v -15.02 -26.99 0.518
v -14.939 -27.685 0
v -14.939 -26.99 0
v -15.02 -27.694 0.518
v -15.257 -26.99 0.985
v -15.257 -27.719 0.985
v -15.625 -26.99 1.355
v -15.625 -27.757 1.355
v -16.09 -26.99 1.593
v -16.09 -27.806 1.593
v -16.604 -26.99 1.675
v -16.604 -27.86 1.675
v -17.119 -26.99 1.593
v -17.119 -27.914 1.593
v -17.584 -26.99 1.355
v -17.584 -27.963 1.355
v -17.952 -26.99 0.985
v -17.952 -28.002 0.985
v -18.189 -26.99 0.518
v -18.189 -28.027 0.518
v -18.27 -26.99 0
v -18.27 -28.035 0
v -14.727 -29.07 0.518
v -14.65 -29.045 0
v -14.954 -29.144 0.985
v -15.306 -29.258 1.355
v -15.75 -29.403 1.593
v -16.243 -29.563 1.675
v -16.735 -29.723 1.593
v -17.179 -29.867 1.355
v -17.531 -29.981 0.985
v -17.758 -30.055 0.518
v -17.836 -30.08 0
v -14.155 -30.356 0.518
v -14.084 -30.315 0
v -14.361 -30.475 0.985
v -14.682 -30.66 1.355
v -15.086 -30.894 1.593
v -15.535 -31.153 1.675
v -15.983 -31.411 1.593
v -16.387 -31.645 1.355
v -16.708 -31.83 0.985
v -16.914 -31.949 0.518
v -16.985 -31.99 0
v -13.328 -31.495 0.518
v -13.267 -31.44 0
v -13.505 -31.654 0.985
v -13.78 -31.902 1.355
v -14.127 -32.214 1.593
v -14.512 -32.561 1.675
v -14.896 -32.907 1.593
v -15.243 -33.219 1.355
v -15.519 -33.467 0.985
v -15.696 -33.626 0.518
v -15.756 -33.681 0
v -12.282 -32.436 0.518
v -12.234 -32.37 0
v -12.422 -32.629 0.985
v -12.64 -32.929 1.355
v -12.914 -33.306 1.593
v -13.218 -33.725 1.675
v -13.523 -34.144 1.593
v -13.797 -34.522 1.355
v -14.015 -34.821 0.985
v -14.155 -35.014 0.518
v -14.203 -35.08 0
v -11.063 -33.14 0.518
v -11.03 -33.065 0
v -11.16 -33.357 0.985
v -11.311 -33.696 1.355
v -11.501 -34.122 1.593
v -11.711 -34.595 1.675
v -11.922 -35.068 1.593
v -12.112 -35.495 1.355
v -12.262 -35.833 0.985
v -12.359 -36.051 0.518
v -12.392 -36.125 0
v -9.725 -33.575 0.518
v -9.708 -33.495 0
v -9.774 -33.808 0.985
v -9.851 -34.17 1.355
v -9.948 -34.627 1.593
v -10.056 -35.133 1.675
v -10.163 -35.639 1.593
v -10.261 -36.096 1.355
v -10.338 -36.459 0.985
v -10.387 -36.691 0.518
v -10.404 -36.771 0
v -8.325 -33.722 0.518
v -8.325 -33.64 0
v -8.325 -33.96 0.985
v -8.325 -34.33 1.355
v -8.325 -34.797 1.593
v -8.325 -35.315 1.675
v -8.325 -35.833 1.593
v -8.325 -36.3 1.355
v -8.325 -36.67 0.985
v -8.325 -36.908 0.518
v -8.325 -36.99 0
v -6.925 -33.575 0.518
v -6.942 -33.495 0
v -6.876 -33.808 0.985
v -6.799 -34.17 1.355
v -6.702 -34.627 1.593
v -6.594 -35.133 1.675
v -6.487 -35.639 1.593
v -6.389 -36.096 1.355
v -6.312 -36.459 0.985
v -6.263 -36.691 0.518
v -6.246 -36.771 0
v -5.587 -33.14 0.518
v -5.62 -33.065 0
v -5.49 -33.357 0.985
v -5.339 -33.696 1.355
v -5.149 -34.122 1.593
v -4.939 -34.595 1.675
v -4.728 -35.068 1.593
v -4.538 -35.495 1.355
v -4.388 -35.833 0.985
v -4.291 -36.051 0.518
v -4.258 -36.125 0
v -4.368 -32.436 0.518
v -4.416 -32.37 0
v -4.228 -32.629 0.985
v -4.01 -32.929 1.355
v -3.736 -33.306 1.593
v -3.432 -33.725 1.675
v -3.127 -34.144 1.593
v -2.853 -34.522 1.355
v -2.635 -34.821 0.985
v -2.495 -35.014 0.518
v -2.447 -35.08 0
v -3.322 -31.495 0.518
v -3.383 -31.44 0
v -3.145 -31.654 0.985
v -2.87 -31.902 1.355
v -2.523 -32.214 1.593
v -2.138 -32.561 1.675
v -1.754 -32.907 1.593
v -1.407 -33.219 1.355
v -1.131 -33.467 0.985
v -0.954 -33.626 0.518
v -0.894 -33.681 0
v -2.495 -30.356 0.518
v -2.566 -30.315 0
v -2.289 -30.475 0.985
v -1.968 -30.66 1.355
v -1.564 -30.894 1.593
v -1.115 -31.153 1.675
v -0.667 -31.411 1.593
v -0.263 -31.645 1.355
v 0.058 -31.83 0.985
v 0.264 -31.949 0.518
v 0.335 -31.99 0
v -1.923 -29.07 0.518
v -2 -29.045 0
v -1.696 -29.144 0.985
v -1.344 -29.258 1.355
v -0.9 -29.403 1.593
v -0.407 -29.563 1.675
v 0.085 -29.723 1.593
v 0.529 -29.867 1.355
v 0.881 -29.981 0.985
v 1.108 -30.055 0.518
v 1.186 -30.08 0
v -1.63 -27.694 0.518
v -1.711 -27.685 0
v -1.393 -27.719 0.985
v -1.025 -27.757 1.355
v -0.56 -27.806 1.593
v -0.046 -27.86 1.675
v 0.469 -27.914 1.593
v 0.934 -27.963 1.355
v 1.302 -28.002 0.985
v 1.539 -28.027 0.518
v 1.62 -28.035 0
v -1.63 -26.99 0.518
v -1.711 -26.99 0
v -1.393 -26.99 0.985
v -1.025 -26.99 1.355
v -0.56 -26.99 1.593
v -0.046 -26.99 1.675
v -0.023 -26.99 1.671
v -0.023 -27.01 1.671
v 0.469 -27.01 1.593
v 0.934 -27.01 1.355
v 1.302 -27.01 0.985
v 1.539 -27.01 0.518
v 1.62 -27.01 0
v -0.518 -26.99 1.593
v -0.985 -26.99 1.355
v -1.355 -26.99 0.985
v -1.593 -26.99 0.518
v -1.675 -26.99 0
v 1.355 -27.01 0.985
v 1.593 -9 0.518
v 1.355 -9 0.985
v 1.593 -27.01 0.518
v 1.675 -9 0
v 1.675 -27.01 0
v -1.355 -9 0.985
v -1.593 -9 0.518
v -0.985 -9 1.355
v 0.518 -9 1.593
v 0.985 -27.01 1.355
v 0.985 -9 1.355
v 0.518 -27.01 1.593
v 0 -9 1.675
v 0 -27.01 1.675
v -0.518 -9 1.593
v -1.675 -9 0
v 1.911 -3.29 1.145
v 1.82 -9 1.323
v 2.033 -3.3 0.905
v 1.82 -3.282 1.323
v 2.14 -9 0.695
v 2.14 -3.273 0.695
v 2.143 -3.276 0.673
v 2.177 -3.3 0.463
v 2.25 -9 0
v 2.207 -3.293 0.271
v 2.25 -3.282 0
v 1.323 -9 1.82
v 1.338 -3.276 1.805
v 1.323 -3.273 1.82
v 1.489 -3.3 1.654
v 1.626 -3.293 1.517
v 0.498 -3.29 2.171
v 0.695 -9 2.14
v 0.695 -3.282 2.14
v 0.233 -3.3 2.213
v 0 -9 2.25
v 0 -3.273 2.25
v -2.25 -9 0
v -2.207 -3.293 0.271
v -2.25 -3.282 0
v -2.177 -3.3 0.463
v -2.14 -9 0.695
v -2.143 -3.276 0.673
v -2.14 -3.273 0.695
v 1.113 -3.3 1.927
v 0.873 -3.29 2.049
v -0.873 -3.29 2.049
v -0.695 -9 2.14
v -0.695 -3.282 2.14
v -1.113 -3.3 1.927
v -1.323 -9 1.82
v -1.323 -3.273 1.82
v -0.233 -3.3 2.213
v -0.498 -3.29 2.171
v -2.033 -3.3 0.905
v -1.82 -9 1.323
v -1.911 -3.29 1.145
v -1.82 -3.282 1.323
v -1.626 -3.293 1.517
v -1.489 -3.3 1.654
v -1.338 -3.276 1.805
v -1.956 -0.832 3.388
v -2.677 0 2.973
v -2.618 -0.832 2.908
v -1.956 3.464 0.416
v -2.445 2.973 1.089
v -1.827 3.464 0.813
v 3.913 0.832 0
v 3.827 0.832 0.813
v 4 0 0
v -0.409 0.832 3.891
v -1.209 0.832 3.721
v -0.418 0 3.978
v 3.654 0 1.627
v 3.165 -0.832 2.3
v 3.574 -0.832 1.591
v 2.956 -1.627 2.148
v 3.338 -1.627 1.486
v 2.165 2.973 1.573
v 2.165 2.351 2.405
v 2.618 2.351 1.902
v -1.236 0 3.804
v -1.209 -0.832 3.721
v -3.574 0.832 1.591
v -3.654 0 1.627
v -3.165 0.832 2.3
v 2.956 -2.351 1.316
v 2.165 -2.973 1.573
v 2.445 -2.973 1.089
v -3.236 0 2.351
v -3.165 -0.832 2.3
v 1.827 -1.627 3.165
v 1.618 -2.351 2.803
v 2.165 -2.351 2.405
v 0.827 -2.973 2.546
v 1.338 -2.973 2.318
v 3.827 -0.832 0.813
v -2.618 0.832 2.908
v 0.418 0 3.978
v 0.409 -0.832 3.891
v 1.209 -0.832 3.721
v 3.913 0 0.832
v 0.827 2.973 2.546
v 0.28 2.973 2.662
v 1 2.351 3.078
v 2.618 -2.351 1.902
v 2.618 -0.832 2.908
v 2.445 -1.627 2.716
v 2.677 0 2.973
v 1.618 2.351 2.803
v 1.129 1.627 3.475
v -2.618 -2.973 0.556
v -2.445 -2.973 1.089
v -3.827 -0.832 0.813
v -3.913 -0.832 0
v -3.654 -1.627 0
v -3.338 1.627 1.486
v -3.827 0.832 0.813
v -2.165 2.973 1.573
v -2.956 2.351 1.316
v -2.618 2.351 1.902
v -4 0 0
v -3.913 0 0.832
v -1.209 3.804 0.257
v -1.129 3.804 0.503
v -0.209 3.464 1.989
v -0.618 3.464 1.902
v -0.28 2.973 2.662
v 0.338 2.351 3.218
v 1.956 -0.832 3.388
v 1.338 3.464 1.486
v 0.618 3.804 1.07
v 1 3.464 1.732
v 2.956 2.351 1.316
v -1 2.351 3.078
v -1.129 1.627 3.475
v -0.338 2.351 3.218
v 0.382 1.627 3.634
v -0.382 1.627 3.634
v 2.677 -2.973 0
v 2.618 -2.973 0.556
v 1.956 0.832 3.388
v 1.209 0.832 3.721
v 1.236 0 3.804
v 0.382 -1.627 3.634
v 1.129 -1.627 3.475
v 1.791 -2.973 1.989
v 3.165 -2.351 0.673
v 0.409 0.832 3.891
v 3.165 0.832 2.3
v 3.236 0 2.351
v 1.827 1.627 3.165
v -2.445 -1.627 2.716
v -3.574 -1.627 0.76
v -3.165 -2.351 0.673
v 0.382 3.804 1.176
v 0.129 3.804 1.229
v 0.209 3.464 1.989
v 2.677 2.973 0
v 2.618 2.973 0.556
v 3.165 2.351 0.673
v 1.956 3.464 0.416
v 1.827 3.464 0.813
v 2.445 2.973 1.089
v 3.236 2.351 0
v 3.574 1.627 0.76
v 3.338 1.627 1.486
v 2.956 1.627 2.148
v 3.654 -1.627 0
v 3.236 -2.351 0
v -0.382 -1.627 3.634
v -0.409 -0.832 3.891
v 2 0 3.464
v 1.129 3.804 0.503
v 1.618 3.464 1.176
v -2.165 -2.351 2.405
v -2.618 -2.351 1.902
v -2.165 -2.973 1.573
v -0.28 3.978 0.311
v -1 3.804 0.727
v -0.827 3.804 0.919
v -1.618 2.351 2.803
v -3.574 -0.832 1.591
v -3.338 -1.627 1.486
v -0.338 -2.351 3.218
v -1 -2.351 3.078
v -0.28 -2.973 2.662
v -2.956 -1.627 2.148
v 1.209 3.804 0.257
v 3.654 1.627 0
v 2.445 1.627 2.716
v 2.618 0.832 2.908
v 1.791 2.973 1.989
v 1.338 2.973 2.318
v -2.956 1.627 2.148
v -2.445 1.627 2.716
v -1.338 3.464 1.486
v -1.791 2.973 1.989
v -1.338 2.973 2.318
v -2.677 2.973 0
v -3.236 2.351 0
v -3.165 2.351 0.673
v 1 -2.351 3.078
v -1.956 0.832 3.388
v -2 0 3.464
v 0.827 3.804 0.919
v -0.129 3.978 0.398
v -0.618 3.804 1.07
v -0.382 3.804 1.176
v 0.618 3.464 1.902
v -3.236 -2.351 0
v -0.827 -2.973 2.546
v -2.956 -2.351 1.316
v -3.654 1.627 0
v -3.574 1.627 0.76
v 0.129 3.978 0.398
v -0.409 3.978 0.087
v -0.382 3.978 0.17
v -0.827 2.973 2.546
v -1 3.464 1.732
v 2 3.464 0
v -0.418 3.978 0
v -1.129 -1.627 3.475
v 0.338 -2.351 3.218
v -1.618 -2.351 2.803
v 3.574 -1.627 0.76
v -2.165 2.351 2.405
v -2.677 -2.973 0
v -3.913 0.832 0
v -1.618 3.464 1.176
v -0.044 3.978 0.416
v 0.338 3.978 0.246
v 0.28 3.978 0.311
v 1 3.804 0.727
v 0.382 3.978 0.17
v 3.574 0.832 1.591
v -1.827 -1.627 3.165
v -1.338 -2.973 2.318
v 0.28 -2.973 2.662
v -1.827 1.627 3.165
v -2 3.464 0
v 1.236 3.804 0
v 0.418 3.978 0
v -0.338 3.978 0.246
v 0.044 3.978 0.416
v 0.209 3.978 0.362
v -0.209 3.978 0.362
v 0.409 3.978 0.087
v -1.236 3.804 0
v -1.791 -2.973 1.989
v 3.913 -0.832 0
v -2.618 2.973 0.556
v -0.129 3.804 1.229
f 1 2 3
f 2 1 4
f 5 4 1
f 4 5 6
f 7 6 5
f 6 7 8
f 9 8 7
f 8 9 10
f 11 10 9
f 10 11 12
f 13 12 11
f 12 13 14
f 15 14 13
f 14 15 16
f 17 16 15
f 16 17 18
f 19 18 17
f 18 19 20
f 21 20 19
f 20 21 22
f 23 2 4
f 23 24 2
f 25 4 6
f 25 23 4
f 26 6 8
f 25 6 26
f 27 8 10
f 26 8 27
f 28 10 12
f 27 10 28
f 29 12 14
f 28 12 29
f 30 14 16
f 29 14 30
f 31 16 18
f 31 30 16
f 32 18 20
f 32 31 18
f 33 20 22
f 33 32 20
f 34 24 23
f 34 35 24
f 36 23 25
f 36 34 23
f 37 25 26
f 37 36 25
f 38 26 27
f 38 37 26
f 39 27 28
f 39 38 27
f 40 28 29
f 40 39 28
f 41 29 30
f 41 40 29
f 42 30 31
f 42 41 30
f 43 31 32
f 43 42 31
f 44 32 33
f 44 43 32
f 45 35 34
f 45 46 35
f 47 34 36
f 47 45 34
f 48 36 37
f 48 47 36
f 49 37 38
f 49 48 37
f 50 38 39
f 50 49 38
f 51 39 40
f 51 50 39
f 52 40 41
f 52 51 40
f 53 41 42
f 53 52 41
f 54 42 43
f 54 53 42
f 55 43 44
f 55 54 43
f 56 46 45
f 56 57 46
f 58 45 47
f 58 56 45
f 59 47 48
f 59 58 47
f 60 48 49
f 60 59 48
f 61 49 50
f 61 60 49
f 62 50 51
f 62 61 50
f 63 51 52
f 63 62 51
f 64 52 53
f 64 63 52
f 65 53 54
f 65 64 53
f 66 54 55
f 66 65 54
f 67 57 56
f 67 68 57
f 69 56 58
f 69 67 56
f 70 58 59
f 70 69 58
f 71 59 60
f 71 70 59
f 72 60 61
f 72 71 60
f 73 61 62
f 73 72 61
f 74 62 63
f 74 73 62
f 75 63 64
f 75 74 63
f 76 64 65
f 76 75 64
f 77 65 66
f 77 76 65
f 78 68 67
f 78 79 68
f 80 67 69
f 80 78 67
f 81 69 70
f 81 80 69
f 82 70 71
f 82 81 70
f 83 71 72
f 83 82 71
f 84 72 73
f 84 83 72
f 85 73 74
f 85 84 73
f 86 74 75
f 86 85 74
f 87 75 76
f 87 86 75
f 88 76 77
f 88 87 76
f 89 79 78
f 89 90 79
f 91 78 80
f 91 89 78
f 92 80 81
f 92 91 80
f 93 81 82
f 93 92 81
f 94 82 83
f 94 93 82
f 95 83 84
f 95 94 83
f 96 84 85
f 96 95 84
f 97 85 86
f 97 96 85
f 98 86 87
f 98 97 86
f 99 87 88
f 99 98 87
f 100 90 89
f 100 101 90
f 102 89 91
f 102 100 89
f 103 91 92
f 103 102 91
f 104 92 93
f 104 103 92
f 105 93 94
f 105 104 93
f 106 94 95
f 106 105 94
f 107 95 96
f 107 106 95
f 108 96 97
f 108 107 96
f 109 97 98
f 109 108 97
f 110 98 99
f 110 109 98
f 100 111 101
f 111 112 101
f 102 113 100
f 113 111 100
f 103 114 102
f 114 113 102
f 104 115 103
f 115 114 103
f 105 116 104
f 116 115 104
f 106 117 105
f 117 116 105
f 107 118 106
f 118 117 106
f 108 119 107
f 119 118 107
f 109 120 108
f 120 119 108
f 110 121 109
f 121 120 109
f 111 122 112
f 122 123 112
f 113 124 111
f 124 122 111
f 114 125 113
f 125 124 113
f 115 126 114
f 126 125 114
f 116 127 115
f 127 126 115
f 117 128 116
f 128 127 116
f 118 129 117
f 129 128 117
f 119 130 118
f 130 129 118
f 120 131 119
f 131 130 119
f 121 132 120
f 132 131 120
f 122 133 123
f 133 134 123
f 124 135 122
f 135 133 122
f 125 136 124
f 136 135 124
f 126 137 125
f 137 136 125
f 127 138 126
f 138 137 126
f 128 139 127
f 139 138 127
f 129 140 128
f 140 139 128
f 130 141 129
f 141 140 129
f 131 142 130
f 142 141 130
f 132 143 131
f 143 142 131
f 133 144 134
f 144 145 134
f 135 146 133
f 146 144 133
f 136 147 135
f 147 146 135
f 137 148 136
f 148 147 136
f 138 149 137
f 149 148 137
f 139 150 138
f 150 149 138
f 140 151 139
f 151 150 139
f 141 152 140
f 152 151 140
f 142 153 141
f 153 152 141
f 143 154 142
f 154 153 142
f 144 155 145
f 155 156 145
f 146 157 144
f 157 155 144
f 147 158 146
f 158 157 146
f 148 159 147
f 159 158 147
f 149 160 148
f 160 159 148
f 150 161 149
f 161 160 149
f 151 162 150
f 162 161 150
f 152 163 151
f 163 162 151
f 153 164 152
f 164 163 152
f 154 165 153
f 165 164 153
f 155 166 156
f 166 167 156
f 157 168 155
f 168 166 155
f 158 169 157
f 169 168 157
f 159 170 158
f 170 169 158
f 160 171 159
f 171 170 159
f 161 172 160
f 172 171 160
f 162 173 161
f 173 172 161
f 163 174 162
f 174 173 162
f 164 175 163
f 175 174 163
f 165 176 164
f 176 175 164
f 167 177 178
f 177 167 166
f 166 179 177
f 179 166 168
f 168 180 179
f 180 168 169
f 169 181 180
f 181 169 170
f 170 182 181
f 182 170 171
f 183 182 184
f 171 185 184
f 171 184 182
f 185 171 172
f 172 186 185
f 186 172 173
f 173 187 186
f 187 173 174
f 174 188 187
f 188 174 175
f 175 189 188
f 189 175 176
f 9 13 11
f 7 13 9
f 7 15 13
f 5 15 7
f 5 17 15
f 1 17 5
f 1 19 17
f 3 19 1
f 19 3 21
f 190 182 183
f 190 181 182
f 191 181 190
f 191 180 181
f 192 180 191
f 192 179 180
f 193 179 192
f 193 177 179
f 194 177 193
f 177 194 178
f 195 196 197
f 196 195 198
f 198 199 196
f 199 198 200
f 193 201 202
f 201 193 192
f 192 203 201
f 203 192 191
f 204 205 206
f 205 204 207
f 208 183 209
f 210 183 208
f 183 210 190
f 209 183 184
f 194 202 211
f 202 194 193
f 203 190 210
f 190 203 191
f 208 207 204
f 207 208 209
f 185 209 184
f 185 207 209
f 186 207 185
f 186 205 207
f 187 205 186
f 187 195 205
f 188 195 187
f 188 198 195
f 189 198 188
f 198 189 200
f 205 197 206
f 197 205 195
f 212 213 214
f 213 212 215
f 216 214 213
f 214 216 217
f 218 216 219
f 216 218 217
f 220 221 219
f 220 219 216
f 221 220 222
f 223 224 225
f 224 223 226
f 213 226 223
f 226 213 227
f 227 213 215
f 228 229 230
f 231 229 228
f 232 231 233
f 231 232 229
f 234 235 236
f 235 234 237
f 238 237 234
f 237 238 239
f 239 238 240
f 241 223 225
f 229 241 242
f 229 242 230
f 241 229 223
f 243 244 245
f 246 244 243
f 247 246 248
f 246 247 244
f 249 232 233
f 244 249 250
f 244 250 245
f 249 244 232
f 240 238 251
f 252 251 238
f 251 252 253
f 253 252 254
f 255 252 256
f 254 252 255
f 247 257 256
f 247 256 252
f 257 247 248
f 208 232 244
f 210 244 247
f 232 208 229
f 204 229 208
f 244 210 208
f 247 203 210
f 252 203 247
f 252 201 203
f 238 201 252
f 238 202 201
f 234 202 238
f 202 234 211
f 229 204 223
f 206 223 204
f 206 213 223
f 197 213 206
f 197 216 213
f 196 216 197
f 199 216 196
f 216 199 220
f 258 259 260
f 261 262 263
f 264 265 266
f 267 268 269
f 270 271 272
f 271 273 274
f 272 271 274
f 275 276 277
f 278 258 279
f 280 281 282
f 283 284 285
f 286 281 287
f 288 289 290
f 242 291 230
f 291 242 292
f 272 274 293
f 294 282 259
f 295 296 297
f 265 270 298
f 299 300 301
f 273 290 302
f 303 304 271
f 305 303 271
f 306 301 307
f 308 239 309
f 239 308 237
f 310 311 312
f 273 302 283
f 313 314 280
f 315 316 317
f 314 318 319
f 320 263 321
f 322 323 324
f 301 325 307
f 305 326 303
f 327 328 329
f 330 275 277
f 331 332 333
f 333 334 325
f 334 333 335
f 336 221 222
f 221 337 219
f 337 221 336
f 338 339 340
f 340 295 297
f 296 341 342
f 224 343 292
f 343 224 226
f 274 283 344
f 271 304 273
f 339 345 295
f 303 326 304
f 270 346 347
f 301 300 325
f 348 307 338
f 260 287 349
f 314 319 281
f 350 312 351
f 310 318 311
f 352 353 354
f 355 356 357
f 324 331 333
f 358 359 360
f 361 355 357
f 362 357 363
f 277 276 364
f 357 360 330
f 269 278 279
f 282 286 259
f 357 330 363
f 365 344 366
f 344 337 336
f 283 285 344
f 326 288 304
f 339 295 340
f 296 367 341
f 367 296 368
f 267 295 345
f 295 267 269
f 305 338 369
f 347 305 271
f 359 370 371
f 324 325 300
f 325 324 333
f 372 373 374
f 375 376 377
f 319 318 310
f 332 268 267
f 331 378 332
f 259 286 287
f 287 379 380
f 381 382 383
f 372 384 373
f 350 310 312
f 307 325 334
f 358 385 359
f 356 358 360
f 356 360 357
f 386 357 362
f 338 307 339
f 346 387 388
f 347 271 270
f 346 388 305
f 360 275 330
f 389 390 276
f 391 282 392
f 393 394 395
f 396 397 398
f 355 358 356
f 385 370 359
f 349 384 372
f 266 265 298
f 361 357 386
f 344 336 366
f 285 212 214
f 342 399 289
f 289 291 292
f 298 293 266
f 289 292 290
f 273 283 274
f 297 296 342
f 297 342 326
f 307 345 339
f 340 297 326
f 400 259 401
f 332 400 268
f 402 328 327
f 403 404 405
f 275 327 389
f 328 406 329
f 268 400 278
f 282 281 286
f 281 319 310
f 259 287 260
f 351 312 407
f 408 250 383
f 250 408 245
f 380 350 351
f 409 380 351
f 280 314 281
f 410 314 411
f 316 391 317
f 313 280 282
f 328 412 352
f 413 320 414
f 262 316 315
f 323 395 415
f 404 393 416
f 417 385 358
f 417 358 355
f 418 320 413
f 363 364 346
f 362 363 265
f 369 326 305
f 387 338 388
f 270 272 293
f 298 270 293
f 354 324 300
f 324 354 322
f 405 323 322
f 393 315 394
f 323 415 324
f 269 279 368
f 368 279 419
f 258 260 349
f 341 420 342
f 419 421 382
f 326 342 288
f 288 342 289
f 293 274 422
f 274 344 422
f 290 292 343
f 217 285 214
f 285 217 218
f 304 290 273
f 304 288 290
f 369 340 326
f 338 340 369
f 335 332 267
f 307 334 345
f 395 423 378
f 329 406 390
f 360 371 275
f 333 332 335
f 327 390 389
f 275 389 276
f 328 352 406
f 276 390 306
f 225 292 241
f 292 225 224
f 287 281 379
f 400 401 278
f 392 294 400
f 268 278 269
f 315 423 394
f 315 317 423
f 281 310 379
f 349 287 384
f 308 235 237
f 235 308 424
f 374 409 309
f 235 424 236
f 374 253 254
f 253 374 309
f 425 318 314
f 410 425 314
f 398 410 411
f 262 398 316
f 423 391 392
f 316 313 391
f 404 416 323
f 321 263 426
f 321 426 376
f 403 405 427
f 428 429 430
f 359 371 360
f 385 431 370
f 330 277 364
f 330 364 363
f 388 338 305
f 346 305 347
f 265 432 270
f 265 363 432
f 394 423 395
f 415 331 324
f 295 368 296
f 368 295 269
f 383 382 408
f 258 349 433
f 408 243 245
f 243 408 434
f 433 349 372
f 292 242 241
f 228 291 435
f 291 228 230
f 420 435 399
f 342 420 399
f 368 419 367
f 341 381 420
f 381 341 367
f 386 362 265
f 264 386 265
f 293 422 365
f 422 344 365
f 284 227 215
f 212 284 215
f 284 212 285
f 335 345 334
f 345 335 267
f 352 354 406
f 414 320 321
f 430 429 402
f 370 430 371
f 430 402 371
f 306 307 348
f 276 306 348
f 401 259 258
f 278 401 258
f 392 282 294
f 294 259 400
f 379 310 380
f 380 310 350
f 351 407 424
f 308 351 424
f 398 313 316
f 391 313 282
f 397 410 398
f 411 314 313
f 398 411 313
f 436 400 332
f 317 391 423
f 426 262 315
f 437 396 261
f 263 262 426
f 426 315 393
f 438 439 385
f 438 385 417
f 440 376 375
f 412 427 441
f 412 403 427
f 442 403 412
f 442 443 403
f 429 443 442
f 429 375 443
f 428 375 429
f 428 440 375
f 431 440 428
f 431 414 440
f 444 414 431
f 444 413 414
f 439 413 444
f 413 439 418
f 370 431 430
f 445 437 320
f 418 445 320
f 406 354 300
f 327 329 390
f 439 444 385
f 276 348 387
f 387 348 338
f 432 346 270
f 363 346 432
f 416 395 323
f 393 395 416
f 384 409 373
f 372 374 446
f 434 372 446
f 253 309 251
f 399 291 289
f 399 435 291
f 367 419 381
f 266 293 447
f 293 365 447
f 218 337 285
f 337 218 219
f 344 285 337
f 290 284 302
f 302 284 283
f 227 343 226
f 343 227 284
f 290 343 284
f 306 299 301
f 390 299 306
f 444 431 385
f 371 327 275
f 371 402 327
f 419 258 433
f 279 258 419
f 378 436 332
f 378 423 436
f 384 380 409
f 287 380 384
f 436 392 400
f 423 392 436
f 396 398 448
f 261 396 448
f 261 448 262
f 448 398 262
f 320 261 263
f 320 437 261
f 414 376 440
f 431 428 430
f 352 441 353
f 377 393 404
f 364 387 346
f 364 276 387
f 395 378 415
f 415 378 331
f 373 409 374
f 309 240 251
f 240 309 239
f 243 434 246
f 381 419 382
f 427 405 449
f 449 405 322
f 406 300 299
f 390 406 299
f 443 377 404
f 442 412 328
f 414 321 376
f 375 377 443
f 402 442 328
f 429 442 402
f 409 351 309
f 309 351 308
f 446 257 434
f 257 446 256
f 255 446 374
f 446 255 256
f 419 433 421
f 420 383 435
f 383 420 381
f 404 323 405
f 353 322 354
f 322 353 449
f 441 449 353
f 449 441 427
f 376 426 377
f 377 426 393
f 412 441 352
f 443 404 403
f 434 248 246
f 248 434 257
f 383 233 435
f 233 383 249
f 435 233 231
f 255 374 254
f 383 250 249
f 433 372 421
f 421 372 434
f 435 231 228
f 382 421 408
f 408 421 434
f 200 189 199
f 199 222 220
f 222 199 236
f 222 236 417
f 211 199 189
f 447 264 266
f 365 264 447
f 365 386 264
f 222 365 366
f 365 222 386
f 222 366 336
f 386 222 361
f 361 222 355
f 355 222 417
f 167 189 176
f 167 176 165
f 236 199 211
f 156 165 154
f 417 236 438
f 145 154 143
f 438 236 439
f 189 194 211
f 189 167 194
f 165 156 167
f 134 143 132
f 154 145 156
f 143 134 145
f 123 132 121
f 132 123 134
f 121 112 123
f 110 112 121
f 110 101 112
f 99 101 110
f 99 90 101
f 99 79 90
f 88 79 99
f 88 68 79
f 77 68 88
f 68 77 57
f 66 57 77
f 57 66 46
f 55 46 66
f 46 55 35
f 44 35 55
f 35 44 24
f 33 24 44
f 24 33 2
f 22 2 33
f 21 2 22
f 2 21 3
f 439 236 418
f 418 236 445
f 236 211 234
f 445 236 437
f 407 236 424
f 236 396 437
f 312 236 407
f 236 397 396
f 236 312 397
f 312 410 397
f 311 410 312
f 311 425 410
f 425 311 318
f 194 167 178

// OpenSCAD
// file: suction-cup-hook.scad
hook_diameter = 3.35;
plug_diameter = 4.5;
ball_diameter = 8;

plug_height = 5;
hook_height = 20;

curve_diameter = 20 - hook_diameter;

include <MCAD/units.scad>
use <MCAD/2Dshapes.scad>

module hook ()
{
    intersection () {
        rotate_extrude ()
        translate ([curve_diameter / 2, 0, 0])
        circle (d=hook_diameter, $fn=20);

        linear_extrude (h=curve_diameter + epsilon, center=true)
        pieSlice (size=curve_diameter + epsilon, start_angle=-90, end_angle=90);
    }
}

module suction_cup_hook () {
    rotate (90, X) {
        sphere (d=ball_diameter, $fn=30);

        translate ([0, 0, ball_diameter/4]) {
            cylinder (d=plug_diameter, h=plug_height + ball_diameter/4, $fn=20);

            translate ([0, 0, plug_height - epsilon]) {
                cylinder (d=hook_diameter, h=hook_height + epsilon * 2, $fn=20);

                translate ([-curve_diameter/2, 0, hook_height])
                rotate (-90, Y)
                rotate (90, X)
                hook ();
            }
        }
    }
}

suction_cup_hook ();
// main file
use <suction-cup-hook.scad>

intersection () {
    suction_cup_hook ();

    linear_extrude (h=100)
    square ([400, 400], center=true);
}
